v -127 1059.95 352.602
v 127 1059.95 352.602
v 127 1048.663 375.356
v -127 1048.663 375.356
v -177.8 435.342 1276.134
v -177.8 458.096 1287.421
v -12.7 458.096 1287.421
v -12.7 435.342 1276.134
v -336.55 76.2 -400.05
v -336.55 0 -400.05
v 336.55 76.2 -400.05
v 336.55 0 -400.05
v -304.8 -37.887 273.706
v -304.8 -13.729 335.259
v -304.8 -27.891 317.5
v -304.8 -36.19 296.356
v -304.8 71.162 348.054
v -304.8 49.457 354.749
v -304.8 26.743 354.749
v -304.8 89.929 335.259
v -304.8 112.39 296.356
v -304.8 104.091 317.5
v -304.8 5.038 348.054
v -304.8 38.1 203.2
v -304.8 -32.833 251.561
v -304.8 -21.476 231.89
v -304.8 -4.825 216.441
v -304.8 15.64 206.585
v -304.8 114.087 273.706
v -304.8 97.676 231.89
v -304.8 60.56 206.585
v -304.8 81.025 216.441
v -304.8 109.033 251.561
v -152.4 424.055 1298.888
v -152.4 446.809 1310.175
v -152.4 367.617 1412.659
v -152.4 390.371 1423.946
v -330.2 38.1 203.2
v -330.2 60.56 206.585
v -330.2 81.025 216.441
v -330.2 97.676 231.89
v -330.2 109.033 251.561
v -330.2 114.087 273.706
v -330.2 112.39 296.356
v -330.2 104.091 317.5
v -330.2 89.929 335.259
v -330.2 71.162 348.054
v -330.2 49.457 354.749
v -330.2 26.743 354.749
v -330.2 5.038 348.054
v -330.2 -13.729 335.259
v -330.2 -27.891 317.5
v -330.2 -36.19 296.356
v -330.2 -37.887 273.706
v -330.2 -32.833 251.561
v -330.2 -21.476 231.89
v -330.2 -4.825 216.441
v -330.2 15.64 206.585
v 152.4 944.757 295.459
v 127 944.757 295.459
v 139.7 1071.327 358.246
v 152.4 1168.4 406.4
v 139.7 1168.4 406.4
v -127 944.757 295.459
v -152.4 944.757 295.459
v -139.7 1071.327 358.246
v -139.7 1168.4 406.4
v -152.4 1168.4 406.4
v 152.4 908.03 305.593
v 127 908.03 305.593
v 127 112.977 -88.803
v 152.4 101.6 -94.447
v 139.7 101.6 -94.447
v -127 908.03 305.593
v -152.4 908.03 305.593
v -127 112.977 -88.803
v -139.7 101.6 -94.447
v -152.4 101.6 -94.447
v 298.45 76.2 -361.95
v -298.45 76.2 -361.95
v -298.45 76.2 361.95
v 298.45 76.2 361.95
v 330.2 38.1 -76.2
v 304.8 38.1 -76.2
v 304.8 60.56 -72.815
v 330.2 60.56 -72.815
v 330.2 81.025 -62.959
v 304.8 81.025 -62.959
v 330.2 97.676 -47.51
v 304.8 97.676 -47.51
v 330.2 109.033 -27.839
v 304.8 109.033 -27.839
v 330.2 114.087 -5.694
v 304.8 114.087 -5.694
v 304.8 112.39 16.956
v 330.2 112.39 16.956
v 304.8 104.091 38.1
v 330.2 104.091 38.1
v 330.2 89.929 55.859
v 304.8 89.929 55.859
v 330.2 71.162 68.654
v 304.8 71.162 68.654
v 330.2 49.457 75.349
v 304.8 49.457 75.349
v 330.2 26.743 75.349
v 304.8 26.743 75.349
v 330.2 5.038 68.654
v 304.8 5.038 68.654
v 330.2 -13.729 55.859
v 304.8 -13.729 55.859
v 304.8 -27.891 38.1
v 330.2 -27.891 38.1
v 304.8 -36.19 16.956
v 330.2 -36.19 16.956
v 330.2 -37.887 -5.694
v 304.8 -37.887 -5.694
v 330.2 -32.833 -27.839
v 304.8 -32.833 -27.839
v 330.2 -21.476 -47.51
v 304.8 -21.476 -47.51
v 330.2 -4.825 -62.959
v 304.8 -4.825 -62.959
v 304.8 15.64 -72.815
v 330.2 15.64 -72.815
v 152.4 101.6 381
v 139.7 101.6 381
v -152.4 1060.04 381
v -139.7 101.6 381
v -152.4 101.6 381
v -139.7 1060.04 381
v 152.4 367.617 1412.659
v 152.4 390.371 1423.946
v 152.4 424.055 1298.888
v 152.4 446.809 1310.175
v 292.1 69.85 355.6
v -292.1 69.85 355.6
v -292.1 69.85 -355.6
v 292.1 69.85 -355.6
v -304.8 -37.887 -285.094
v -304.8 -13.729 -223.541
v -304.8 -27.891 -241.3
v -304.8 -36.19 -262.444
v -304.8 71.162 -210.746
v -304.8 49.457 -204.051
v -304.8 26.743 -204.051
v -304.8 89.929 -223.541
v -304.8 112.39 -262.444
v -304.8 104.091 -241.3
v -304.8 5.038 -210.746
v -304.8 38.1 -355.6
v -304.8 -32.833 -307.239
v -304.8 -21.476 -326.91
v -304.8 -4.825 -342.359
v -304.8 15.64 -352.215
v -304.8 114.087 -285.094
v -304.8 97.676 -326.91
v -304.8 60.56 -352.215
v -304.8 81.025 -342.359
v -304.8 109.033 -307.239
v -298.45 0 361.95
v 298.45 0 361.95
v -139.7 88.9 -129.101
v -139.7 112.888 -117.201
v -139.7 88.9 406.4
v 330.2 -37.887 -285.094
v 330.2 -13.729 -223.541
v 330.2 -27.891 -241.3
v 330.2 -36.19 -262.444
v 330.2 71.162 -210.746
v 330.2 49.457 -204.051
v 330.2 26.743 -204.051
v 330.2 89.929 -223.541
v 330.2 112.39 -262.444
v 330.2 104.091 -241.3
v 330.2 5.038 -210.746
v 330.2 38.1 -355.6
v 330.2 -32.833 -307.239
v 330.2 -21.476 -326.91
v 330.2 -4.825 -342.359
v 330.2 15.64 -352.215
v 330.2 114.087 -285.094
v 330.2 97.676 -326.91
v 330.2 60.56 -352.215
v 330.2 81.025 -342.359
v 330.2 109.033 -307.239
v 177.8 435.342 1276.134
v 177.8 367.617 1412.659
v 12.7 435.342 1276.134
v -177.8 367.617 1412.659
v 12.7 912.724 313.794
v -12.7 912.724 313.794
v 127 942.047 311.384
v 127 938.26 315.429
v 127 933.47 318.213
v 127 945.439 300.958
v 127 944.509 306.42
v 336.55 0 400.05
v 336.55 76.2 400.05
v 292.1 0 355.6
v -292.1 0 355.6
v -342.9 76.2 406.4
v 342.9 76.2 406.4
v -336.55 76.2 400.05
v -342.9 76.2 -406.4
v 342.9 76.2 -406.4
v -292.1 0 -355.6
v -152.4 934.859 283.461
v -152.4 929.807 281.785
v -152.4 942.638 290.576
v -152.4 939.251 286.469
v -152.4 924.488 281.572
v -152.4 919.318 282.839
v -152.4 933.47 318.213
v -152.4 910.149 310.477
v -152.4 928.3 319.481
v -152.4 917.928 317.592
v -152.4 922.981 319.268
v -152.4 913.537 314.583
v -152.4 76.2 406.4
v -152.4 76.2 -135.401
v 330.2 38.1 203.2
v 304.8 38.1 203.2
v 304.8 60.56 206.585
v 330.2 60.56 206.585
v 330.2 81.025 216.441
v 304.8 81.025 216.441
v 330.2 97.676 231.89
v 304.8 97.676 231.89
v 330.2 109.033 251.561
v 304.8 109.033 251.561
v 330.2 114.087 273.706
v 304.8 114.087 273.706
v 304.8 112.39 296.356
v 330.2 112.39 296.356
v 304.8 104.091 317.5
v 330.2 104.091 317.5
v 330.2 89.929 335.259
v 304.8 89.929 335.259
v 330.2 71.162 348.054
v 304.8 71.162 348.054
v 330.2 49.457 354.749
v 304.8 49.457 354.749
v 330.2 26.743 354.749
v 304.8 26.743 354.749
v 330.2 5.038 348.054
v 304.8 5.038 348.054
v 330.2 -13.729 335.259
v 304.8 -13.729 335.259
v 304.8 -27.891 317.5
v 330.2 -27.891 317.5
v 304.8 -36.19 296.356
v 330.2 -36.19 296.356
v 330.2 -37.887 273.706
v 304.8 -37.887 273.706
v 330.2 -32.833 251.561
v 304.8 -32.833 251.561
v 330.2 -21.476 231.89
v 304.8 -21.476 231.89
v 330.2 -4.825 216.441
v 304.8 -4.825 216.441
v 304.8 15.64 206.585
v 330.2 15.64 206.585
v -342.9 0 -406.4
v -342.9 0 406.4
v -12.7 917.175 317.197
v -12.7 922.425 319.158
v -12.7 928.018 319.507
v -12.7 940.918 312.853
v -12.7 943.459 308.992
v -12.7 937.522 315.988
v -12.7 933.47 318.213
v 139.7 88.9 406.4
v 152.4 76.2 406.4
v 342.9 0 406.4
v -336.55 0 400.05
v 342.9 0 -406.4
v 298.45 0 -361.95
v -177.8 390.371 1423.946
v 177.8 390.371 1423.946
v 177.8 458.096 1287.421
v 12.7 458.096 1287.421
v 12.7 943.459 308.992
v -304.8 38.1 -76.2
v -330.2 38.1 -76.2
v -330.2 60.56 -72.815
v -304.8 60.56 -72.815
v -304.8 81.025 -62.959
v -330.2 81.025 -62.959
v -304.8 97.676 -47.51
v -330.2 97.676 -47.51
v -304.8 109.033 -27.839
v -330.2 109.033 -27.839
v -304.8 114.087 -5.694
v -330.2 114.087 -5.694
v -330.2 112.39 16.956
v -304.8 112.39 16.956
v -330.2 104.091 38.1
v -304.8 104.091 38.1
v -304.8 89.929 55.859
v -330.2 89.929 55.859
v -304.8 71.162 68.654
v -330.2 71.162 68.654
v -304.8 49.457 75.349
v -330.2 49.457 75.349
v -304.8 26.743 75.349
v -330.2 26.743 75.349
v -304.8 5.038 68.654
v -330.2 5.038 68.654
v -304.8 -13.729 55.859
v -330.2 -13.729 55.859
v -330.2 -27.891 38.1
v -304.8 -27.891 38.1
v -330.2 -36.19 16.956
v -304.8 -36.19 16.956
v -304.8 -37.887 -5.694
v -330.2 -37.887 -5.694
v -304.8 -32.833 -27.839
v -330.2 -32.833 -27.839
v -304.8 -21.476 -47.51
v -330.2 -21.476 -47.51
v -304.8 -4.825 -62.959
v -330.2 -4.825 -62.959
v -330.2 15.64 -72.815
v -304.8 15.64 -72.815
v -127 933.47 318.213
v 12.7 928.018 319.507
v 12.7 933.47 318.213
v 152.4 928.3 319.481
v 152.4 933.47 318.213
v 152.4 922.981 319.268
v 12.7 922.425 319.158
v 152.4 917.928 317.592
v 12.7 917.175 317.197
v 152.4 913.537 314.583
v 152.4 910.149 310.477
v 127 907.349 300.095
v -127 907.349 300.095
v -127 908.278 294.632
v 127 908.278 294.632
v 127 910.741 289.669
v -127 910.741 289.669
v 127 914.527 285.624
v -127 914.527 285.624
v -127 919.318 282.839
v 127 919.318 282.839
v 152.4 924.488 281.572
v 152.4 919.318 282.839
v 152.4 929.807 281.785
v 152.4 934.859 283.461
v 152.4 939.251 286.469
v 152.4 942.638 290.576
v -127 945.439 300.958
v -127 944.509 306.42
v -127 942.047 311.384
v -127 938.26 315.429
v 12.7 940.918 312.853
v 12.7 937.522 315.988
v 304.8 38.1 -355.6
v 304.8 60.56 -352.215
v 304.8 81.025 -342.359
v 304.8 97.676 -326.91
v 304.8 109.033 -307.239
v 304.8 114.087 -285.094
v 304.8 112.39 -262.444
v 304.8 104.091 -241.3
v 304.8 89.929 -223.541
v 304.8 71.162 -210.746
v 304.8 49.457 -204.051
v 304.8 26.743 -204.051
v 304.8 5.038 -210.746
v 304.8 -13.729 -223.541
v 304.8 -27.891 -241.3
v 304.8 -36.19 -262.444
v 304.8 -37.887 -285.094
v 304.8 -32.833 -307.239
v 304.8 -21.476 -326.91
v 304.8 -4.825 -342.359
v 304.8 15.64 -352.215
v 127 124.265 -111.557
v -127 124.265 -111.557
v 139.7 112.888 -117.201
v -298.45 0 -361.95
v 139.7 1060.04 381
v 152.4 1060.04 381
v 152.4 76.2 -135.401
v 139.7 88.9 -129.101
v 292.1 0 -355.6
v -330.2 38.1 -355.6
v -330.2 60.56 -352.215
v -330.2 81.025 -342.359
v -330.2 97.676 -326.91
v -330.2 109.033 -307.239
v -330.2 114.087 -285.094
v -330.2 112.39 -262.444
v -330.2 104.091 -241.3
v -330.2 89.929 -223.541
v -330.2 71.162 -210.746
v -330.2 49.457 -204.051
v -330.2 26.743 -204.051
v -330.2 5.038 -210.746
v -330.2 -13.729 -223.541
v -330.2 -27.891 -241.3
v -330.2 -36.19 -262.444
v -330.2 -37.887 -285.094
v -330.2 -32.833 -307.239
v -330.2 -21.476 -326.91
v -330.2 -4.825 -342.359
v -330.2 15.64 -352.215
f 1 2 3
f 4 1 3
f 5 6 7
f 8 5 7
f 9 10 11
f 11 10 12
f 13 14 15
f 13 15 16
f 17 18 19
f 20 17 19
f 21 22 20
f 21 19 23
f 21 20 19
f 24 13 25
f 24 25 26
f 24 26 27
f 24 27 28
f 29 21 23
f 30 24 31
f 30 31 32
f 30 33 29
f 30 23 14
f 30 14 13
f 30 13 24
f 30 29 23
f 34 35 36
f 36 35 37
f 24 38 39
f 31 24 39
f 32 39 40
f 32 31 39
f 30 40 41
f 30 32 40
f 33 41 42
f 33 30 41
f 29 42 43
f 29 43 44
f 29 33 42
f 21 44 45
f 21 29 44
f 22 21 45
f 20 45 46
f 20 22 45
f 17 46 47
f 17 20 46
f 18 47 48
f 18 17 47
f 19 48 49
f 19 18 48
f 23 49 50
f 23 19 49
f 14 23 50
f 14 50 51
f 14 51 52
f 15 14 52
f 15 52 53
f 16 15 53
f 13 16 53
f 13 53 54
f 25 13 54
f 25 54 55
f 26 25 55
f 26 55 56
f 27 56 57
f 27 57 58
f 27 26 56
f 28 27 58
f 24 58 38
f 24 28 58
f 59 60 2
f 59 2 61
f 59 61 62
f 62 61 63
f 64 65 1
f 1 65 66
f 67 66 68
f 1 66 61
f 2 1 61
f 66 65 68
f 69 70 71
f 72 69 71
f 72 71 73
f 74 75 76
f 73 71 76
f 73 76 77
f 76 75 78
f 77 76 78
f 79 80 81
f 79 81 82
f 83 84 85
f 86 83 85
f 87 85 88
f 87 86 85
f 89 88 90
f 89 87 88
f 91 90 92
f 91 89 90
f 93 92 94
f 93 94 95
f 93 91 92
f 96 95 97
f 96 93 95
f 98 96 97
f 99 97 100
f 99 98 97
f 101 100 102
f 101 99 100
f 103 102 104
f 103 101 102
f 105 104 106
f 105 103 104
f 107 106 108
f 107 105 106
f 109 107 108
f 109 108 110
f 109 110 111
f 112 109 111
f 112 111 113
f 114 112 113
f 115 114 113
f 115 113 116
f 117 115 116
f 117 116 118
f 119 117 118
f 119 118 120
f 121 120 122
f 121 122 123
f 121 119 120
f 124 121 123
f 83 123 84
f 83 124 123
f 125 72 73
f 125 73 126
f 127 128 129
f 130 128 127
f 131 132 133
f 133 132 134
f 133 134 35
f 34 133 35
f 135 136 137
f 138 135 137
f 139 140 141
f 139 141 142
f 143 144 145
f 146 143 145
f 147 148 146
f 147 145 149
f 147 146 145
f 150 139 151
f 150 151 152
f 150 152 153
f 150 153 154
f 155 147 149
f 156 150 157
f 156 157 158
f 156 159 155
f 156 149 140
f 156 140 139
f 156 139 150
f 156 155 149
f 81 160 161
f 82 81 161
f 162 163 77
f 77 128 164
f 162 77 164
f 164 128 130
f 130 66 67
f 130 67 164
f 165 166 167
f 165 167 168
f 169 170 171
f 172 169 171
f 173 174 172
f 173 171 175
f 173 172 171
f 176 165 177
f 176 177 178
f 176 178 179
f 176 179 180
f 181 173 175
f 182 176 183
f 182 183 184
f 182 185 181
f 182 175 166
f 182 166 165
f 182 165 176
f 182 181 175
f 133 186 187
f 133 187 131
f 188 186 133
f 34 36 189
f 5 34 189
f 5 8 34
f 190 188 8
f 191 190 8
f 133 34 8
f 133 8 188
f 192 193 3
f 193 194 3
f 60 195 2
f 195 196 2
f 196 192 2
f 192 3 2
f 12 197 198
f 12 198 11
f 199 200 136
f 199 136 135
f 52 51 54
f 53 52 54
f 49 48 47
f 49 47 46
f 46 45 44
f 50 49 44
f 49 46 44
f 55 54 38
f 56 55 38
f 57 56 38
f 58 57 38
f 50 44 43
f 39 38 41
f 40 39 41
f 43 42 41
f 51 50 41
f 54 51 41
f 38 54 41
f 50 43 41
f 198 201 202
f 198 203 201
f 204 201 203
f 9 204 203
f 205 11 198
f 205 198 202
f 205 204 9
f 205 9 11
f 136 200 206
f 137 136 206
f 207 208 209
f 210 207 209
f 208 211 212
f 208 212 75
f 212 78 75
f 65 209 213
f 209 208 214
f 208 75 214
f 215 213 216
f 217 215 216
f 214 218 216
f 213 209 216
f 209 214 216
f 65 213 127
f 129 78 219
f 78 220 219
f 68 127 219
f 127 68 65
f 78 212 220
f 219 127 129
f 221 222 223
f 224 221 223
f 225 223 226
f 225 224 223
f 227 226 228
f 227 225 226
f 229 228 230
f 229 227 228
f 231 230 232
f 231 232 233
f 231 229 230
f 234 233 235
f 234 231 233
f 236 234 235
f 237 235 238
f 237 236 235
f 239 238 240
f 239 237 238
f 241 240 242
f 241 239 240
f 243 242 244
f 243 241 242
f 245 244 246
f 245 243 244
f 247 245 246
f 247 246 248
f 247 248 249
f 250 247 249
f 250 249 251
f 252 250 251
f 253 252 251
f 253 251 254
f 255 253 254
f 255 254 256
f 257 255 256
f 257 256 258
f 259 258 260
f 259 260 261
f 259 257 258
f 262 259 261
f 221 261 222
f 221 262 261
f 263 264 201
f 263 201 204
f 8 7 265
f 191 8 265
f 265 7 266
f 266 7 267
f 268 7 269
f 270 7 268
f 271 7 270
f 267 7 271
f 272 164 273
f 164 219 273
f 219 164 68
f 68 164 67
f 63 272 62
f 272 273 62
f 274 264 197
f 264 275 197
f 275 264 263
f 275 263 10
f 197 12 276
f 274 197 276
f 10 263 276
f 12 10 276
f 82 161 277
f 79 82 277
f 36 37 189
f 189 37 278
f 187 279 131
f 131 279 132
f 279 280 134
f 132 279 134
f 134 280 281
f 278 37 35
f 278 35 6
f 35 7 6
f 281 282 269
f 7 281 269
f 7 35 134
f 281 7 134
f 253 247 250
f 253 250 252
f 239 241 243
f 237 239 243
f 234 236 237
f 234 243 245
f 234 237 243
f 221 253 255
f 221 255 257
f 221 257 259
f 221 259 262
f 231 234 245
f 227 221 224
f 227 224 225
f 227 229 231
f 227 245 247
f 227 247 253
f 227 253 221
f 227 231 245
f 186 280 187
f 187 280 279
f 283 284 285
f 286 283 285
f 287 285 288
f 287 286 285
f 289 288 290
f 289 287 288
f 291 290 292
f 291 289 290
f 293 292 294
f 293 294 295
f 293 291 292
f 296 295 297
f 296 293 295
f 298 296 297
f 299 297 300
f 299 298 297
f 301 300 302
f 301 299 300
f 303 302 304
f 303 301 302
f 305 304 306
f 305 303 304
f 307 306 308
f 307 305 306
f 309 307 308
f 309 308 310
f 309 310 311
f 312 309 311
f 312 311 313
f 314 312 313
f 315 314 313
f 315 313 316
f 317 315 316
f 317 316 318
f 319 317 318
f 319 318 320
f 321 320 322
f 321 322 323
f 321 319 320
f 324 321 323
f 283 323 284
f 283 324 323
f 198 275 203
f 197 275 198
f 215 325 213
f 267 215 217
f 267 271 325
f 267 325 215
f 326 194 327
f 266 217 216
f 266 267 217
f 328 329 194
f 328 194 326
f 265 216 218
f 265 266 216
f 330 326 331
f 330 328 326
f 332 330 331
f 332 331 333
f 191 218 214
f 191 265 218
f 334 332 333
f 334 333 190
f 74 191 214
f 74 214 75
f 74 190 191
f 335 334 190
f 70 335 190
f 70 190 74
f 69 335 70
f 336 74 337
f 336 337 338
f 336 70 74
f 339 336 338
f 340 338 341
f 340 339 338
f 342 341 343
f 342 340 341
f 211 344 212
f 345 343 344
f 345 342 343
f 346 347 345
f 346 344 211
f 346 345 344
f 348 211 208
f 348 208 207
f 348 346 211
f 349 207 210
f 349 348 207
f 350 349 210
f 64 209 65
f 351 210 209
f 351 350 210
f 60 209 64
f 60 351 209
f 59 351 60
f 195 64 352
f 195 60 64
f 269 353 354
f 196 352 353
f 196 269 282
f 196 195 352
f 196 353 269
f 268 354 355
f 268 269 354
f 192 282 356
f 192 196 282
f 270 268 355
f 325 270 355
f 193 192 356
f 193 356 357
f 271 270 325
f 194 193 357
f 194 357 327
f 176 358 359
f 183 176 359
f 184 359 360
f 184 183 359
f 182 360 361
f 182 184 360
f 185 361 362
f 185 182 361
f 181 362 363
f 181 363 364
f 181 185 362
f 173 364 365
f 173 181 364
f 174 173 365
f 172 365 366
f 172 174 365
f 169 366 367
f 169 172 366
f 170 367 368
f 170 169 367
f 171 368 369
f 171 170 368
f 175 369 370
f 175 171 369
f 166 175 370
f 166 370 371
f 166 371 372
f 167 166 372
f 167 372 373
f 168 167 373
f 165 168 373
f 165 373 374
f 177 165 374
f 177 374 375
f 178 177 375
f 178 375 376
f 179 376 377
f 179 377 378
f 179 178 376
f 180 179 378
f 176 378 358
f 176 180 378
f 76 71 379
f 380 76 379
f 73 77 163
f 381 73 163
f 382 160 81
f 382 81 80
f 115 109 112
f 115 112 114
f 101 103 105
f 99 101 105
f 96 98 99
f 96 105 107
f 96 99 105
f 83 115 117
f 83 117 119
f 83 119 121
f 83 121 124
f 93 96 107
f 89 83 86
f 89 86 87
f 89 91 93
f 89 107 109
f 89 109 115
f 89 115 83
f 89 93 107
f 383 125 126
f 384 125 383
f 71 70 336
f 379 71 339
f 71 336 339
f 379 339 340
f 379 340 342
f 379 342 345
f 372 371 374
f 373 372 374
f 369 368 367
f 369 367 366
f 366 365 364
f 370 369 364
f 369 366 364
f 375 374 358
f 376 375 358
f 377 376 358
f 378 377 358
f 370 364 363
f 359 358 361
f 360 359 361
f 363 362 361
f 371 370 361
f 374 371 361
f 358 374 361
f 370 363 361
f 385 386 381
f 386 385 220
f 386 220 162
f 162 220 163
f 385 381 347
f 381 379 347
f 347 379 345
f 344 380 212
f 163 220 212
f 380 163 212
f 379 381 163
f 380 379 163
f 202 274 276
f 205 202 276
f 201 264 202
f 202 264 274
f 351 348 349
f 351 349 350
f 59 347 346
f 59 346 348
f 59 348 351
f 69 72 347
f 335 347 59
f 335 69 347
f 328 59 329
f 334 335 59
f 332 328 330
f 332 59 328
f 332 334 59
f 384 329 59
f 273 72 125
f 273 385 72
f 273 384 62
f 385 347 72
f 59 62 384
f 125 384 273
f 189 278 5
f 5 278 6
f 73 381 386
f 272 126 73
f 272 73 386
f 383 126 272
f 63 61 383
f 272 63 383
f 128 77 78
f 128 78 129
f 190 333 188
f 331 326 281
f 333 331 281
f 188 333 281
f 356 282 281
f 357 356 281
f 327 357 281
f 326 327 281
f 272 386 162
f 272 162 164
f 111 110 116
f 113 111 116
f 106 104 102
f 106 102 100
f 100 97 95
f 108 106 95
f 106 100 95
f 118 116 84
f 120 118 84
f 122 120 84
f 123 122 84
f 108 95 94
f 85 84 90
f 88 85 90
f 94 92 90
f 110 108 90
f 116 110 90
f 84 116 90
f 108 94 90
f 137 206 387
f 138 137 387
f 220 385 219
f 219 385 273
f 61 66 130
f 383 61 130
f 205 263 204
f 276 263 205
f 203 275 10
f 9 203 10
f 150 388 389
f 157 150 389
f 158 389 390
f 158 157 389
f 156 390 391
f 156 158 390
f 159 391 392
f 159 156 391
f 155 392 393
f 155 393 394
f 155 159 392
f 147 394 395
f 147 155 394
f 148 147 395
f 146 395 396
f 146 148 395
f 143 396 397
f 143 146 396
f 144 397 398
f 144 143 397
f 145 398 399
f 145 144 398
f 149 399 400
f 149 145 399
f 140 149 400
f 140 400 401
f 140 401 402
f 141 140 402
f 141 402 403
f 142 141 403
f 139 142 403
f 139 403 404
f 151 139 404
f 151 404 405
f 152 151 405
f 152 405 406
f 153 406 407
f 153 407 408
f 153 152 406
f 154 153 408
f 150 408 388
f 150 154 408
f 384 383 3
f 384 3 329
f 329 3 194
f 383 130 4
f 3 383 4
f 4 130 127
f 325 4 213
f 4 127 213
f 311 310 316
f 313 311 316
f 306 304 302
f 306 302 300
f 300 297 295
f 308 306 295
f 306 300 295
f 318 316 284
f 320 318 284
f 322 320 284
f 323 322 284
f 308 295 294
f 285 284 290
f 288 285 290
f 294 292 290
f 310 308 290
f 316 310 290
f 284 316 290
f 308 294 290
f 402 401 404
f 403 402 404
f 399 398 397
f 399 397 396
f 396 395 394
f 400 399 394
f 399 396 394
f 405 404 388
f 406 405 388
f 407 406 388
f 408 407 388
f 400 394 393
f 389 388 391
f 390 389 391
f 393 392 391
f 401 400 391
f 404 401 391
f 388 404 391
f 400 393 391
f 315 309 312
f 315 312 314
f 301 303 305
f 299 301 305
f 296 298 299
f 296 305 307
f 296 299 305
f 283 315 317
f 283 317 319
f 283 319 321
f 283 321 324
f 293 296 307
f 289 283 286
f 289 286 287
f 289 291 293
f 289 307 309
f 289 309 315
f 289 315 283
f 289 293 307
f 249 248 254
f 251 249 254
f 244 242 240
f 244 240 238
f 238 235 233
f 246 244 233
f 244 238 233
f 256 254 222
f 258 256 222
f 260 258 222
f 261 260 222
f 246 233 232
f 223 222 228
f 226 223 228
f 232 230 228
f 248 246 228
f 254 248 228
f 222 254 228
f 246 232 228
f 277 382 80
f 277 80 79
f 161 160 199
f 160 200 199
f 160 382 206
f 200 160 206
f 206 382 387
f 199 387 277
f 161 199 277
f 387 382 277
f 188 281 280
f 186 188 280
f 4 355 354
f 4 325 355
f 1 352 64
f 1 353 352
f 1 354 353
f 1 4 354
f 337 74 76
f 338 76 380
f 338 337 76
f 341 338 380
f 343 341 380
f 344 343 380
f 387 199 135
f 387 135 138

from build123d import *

# Parameters (mm, degrees)
SKETCH3_W             = 685.8
SKETCH3_H             = 812.8
SKETCH3_W_2           = 673.1
SKETCH3_H_2           = 800.1
EXTRUDE_THIN1_DEPTH   = 76.2
SKETCH5_W             = 596.9
SKETCH5_H             = 723.9
SKETCH5_W_2           = 584.2
SKETCH5_H_2           = 711.2
EXTRUDE_THIN2_DEPTH   = 76.2
BOSS_EXTRUDE2_START   = -12.7
SKETCH6_R             = 76.2
BOSS_EXTRUDE2_DEPTH   = 25.4
BOSS_EXTRUDE2_2_DEPTH = 25.4
BOSS_EXTRUDE2_3_DEPTH = 25.4
BOSS_EXTRUDE3_START   = 622.3
SKETCH6_2_R           = 76.2
BOSS_EXTRUDE3_DEPTH   = 25.4
BOSS_EXTRUDE3_2_DEPTH = 25.4
BOSS_EXTRUDE3_3_DEPTH = 25.4
SKETCH10_W            = 711.2
SKETCH10_H            = 6.35
EXTRUDE_THIN3_DEPTH   = 584.2
EXTRUDE_THIN4_DEPTH   = 152.4
SHELL2_T              = -12.7
BOSS_EXTRUDE4_DEPTH   = 279.4
SHELL3_T              = -12.7
SKETCH13_R            = 19.05
BOSS_EXTRUDE5_DEPTH   = 152.4
BOSS_EXTRUDE6_DEPTH   = 25.4


with BuildPart() as part:
    # Sketch3 → Extrude-Thin1 (new body)
    with BuildSketch(Plane(origin=(0, 0, 0), x_dir=(1, 0, 0), z_dir=(0, 1, 0))):
        Rectangle(SKETCH3_W, SKETCH3_H)
        Rectangle(SKETCH3_W_2, SKETCH3_H_2, mode=Mode.SUBTRACT)
    extrude(amount=EXTRUDE_THIN1_DEPTH)


with BuildPart() as body_2:
    # Sketch5 → Extrude-Thin2 (new body)
    with BuildSketch(Plane(origin=(0, 0, 0), x_dir=(1, 0, 0), z_dir=(0, 1, 0))):
        Rectangle(SKETCH5_W, SKETCH5_H)
        Rectangle(SKETCH5_W_2, SKETCH5_H_2, mode=Mode.SUBTRACT)
    extrude(amount=EXTRUDE_THIN2_DEPTH)

    # Sketch10 → Extrude-Thin3 (add)
    with BuildSketch(Plane(origin=(-292.1, 0, 0), x_dir=(0, 0, -1), z_dir=(1, 0, 0))):
        with Locations((0, 73.025)):
            Rectangle(SKETCH10_W, SKETCH10_H)
    extrude(amount=EXTRUDE_THIN3_DEPTH)


with BuildPart() as body_3:
    # Sketch6 → Boss-Extrude2 (new body)
    with BuildSketch(Plane(origin=(-292.1, 0, 0), x_dir=(0, 0, -1), z_dir=(1, 0, 0)).offset(BOSS_EXTRUDE2_START)):
        with Locations((0, 38.1)):
            Circle(SKETCH6_R)
    extrude(amount=-BOSS_EXTRUDE2_DEPTH)


with BuildPart() as body_4:
    # Sketch6 → Boss-Extrude2 2 (new body)
    with BuildSketch(Plane(origin=(-292.1, 0, 0), x_dir=(0, 0, -1), z_dir=(1, 0, 0)).offset(BOSS_EXTRUDE2_START)):
        with Locations((-279.4, 38.1)):
            Circle(SKETCH6_R)
    extrude(amount=-BOSS_EXTRUDE2_2_DEPTH)


with BuildPart() as body_5:
    # Sketch6 → Boss-Extrude2 3 (new body)
    with BuildSketch(Plane(origin=(-292.1, 0, 0), x_dir=(0, 0, -1), z_dir=(1, 0, 0)).offset(BOSS_EXTRUDE2_START)):
        with Locations((279.4, 38.1)):
            Circle(SKETCH6_R)
    extrude(amount=-BOSS_EXTRUDE2_3_DEPTH)


with BuildPart() as body_6:
    # Sketch6<2> → Boss-Extrude3 (new body)
    with BuildSketch(Plane(origin=(-292.1, 0, 0), x_dir=(0, 0, -1), z_dir=(1, 0, 0)).offset(BOSS_EXTRUDE3_START)):
        with Locations((0, 38.1)):
            Circle(SKETCH6_2_R)
    extrude(amount=-BOSS_EXTRUDE3_DEPTH)


with BuildPart() as body_7:
    # Sketch6<2> → Boss-Extrude3 2 (new body)
    with BuildSketch(Plane(origin=(-292.1, 0, 0), x_dir=(0, 0, -1), z_dir=(1, 0, 0)).offset(BOSS_EXTRUDE3_START)):
        with Locations((-279.4, 38.1)):
            Circle(SKETCH6_2_R)
    extrude(amount=-BOSS_EXTRUDE3_2_DEPTH)


with BuildPart() as body_8:
    # Sketch6<2> → Boss-Extrude3 3 (new body)
    with BuildSketch(Plane(origin=(-292.1, 0, 0), x_dir=(0, 0, -1), z_dir=(1, 0, 0)).offset(BOSS_EXTRUDE3_START)):
        with Locations((279.4, 38.1)):
            Circle(SKETCH6_2_R)
    extrude(amount=-BOSS_EXTRUDE3_3_DEPTH)


with BuildPart() as body_9:
    # Sketch11 → Extrude-Thin4 (new, symmetric)
    with BuildSketch(Plane(origin=(0, 0, 0), x_dir=(0, 0, -1), z_dir=(1, 0, 0))):
        Polygon((-406.4, 76.2), (-406.4, 1168.4), (135.400516796, 76.2), align=None)
        Polygon((-381, 101.6), (-381, 1060.039896641), (94.447016405, 101.6), align=None, mode=Mode.SUBTRACT)
    extrude(amount=EXTRUDE_THIN4_DEPTH, both=True)

    # Shell2
    shell2_openings = [body_9.faces().sort_by_distance(p)[0] for p in [
        (0, 101.6, 143.276491797),
        (0, 580.81994832, 143.276491797),
        (0, 580.81994832, 381),
        (0, 622.3, 406.4),
        (0, 622.3, 135.499741602),
    ]]
    offset(amount=SHELL2_T, openings=shell2_openings, kind=Kind.INTERSECTION)



with BuildPart() as body_10:
    # Sketch12 → Boss-Extrude4 (new body)
    with BuildSketch(Plane(origin=(-139.7, 0, 0), x_dir=(0, 0, -1), z_dir=(1, 0, 0))):
        Polygon((-381, 1060.039896641), (94.447016405, 101.6), (117.201183072, 112.887510767), (-358.245833333, 1071.327407407), align=None)
    extrude(amount=BOSS_EXTRUDE4_DEPTH)

    # Shell3
    shell3_openings = [body_10.faces().sort_by_distance(p)[0] for p in [
        (0, 592.107459087, 120.522325131),
        (0, 580.81994832, 143.276491797),
    ]]
    offset(amount=SHELL3_T, openings=shell3_openings, kind=Kind.INTERSECTION)


with BuildPart() as body_9_1:
    add(body_9.part)

    add(body_10.part)  # Boss-Extrude5 merges body 10
    # Sketch13 → Boss-Extrude5 (add, symmetric)
    with BuildSketch(Plane(origin=(0, 0, 0), x_dir=(0, 0, -1), z_dir=(1, 0, 0))):
        with Locations(Location((-300.526287858, 926.393755383, 0), (0, 0, 158.194644645))):
            Circle(SKETCH13_R)
    extrude(amount=BOSS_EXTRUDE5_DEPTH, both=True)

    # Sketch14 → Boss-Extrude6 (add)
    with BuildSketch(Plane(origin=(0, 880.15207481, 436.611288217), x_dir=(1, 0, 0), z_dir=(0, 0.8958333333333334, 0.4443901876604491))):
        Polygon((-12.7, 142.458828596), (12.7, 142.458828596), (12.7, -949.741171404), (177.8, -949.741171404), (177.8, -1102.141171404), (152.4, -1102.141171404), (152.4, -975.141171404), (-152.4, -975.141171404), (-152.4, -1102.141171404), (-177.8, -1102.141171404), (-177.8, -949.741171404), (-12.7, -949.741171404), align=None)
    extrude(amount=-BOSS_EXTRUDE6_DEPTH)


solid = Compound([part.part, body_2.part, body_3.part, body_4.part, body_5.part, body_6.part, body_7.part, body_8.part, body_9_1.part])
